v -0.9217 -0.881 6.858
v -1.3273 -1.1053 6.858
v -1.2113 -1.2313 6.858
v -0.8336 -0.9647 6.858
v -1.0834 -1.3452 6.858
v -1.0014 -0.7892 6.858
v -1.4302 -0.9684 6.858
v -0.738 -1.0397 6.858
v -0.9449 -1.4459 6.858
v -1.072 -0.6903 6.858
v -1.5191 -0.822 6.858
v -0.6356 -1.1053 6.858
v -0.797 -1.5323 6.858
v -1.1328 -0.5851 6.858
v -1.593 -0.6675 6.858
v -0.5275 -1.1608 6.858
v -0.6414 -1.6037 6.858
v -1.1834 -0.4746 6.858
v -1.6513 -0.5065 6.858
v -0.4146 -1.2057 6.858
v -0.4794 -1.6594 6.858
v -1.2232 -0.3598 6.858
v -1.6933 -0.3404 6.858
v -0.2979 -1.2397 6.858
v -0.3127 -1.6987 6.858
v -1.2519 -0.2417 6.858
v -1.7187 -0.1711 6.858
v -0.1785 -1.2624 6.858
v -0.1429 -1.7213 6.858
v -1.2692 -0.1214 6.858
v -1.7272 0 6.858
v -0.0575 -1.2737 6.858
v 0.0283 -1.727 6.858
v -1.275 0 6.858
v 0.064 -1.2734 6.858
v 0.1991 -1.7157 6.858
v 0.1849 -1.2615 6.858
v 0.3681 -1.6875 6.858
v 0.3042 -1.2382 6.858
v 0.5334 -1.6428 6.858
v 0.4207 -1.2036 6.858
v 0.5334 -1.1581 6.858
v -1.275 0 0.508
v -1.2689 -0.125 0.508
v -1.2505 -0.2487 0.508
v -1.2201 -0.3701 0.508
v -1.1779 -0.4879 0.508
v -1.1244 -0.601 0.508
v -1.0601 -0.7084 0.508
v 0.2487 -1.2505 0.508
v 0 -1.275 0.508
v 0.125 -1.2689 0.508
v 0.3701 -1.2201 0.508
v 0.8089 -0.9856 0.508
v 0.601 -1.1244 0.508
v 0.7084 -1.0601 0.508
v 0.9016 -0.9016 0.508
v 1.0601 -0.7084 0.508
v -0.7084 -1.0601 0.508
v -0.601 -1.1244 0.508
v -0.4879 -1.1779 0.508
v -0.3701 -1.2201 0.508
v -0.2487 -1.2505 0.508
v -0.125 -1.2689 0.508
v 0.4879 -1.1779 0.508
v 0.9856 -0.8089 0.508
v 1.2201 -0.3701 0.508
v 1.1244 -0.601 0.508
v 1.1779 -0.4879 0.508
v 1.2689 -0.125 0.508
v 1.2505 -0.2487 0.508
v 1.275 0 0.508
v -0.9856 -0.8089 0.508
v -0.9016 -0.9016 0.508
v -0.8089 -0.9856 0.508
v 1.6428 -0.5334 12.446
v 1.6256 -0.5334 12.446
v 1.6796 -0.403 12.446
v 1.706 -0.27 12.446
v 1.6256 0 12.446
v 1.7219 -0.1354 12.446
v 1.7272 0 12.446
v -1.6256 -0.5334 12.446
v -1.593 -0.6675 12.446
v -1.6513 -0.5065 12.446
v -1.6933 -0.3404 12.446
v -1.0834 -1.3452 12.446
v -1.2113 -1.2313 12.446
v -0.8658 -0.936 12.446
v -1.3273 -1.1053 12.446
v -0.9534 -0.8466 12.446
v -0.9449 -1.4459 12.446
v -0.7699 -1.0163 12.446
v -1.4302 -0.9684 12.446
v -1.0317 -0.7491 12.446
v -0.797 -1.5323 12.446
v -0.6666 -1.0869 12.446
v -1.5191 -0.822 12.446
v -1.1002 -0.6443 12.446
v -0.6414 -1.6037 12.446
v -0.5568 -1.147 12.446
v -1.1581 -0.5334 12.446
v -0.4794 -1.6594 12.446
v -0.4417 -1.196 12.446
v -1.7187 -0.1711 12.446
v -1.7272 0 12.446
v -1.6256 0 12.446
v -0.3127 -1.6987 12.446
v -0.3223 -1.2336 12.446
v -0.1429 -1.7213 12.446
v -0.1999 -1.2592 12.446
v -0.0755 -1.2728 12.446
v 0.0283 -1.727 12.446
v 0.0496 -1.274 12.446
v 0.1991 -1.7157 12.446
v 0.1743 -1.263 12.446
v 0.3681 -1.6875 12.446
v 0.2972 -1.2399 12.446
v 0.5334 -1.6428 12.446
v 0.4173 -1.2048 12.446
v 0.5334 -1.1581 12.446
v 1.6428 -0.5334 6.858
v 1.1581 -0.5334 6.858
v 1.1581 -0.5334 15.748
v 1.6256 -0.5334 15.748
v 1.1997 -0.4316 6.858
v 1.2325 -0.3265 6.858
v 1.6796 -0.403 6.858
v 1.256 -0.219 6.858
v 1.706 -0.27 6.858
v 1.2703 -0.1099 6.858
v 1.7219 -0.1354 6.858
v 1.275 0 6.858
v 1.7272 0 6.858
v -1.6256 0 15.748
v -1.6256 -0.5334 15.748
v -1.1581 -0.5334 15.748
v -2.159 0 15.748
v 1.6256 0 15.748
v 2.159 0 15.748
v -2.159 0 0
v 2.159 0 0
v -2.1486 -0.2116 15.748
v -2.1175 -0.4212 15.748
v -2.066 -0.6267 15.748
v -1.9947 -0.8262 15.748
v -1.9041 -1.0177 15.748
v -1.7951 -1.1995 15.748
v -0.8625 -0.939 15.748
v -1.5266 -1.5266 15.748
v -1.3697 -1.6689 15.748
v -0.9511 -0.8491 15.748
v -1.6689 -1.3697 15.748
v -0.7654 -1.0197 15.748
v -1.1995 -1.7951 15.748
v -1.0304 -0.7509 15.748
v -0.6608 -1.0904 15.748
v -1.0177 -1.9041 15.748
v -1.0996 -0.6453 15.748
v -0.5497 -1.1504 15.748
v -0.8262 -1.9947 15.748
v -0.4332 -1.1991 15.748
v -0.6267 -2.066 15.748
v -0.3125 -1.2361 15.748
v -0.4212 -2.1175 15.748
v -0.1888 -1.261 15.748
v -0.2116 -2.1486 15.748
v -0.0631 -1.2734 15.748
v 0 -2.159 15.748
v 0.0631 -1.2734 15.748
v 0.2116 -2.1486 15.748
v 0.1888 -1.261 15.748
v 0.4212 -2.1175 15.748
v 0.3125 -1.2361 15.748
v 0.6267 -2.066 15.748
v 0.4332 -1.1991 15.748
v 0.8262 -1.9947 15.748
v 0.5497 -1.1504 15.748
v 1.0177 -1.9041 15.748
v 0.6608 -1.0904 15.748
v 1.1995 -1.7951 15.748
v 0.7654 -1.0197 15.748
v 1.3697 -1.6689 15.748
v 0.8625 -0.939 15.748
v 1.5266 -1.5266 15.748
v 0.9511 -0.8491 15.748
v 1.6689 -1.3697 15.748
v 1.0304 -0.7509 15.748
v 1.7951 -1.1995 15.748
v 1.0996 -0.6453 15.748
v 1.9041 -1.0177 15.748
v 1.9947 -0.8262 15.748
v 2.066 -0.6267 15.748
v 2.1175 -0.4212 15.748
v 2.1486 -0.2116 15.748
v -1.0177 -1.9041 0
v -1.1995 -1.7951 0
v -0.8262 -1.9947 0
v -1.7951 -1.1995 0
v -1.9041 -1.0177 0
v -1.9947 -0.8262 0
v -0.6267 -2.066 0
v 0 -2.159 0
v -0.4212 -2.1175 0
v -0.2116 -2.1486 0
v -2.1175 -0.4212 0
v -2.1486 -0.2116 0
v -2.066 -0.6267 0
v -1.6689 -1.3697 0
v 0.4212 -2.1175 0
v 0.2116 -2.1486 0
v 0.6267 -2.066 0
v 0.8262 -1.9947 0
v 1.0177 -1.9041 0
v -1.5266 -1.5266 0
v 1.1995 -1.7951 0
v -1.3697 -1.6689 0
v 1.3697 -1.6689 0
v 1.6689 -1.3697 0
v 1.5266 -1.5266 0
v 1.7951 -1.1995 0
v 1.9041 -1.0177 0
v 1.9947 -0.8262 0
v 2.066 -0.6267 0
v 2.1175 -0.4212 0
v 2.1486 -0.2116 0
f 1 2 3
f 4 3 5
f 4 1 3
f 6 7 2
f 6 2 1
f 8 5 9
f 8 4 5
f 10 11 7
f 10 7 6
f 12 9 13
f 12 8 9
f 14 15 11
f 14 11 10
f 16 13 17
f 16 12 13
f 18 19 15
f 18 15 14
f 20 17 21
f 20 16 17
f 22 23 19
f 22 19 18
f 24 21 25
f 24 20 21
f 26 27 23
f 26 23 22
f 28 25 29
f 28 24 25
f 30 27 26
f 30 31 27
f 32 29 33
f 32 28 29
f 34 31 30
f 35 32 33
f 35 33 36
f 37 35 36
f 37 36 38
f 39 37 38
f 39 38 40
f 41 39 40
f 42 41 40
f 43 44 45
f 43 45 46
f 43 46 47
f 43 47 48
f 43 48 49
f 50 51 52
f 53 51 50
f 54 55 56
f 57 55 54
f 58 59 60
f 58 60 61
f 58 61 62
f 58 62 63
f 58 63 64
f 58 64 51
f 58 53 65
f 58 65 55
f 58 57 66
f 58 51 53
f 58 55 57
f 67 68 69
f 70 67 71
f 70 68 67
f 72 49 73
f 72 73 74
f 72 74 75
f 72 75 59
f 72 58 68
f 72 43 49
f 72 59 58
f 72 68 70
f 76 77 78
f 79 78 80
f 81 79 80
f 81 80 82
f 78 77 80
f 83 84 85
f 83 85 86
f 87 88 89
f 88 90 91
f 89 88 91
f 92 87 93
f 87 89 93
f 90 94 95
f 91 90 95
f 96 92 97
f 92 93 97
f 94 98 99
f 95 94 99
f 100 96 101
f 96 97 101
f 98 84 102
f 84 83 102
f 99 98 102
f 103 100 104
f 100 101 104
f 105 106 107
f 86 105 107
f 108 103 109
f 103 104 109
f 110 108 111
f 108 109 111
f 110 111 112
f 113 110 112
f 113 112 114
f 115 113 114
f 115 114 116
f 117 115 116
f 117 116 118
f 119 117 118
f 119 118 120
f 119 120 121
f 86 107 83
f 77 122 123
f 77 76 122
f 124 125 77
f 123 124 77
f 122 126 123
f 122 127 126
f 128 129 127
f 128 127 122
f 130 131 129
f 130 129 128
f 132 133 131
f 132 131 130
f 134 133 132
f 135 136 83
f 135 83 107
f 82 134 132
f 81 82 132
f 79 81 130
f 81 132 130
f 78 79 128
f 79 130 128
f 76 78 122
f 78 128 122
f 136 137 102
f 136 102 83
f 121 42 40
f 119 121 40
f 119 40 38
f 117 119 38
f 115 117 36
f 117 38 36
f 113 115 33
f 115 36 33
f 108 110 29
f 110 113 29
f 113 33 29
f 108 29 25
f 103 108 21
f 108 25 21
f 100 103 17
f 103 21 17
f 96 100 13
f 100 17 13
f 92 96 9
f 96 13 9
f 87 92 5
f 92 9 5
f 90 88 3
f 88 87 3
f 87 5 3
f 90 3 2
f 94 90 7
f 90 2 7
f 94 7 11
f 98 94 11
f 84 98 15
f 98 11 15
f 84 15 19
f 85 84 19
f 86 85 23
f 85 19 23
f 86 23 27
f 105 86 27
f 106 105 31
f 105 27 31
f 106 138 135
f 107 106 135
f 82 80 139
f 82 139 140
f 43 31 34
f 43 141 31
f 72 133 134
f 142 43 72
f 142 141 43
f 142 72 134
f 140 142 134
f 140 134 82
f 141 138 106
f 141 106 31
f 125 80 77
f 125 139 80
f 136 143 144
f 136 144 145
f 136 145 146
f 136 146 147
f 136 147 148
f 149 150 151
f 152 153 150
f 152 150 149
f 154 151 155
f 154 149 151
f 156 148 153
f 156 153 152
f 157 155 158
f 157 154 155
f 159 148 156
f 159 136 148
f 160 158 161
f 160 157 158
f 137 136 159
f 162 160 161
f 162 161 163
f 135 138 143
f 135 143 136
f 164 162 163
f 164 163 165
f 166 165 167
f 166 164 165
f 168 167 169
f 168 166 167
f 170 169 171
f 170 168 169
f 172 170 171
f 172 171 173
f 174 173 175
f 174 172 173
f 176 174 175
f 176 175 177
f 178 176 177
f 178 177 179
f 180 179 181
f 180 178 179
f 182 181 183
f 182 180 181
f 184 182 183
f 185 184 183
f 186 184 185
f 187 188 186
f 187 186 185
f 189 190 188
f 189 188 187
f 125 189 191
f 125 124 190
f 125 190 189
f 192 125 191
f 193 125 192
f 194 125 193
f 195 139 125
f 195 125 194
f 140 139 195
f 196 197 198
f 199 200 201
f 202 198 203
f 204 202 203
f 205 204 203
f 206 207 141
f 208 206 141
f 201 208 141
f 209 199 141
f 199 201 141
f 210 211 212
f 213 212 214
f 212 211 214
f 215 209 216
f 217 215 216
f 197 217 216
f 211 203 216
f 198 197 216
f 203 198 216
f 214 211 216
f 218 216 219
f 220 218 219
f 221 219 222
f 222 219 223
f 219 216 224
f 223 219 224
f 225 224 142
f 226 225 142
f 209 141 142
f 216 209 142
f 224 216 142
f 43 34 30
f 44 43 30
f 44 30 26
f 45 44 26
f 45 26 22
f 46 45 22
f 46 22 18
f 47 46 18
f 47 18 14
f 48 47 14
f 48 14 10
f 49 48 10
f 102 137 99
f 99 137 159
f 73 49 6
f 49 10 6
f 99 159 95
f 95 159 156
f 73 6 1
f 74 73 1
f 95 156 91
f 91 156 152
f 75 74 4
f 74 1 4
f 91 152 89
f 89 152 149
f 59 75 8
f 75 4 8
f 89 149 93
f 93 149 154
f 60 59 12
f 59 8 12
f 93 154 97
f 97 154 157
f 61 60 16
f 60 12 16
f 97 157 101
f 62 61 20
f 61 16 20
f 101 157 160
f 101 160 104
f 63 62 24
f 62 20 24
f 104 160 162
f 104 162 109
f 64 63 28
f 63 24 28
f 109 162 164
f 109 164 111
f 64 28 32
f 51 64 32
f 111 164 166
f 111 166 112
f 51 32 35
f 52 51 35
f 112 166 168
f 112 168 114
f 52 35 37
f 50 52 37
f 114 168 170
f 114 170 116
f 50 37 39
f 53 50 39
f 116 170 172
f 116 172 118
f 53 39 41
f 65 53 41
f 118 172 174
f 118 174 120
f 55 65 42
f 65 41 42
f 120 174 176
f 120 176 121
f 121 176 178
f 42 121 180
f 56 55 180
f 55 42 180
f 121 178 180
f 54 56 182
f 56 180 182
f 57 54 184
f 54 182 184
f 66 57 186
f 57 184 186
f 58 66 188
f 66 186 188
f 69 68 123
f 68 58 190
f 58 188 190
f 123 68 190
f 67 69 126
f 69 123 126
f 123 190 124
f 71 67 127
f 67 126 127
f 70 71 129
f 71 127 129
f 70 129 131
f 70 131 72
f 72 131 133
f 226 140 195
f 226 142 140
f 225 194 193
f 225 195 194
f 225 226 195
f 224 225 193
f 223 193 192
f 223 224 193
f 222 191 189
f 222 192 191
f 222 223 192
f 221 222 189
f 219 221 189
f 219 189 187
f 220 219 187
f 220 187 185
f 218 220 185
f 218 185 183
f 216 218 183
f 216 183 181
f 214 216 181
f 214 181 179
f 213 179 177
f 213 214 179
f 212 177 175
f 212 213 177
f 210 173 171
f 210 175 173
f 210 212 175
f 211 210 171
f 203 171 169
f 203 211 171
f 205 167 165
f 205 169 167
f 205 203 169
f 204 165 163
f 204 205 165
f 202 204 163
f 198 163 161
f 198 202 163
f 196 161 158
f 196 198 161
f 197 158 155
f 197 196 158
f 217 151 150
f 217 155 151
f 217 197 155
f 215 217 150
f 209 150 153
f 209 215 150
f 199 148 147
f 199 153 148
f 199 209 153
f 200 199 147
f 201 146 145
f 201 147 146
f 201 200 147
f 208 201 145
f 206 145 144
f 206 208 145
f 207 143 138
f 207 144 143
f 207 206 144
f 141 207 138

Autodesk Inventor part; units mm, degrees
ref_plane "YZ Plane" through (0, 0, 0) normal (1, 0, 0) x (0, 1, 0)
ref_plane "XZ Plane" through (0, 0, 0) normal (0, 1, 0) x (-1, 0, 0)
sketch "Sketch1" plane through (0, 0, 0) normal (0, 0, 1) x (1, 0, 0)
  circle A0 centre (0, 0) radius 2.159
  dimension "d0" = 4.318
extrude "Extrusion1" add sketch "Sketch1" along normal blind 15.748
sketch "Sketch2" plane through (0, 0, 15.748) normal (0, 0, 1) x (1, 0, 0)
  circle A0 centre (0, 0) radius 1.275
  dimension "d23" = 2.55
extrude "Extrusion2" cut sketch "Sketch2" against normal blind 15.24
sketch "Sketch6" plane through (0, 0, 15.748) normal (0, 0, 1) x (1, 0, 0)
  line L0 (-1.6256, 0.5334) -> (1.6256, 0.5334)
  line L1 (1.6256, 0.5334) -> (1.6256, -0.5334)
  line L2 (1.6256, -0.5334) -> (-1.6256, -0.5334)
  line L3 (-1.6256, -0.5334) -> (-1.6256, 0.5334)
  point P0 (0, 0)
  dimension "d24" = 0.5334
  dimension "d25" = 0.5334
  dimension "d26" = 1.6256
  dimension "d27" = 1.6256
extrude "Extrusion6" cut sketch "Sketch6" against normal blind 8.89
ref_plane "Work Plane2" through (0, 0, 6.858) normal (0, 0, 1) x (1, 0, 0)
sketch "Sketch7" plane through (0, 0, 6.858) normal (0, 0, 1) x (1, 0, 0)
  line L0 (1.6428, -0.5334) -> (1.1581, -0.5334)
  line L1 (-1.6428, 0.5334) -> (-0.5334, 0.5334)
  arc A0 (1.6428, -0.5334) -> (-0.5334, 1.6428) centre (0, 0) ccw
  arc A1 (-1.6428, 0.5334) -> (0.5334, -1.6428) centre (0, 0) ccw
  line L2 (1.6256, -0.5334) -> (0.5334, -0.5334)
  line L3 (0.5334, -0.5334) -> (0.5334, -1.6428)
  line L4 (-0.5334, 0.5334) -> (-0.5334, 1.6428)
extrude "Extrusion7" cut sketch "Sketch7" along normal blind 5.588
sketch "Sketch8" plane through (0, 0, 0) normal (0, 0, -1) x (-1, 0, 0)
  line L0 (-3.8846, 4.0845) -> (4.056, 4.0845)
  line L1 (4.056, 4.0845) -> (4.056, 0)
  line L2 (4.056, 0) -> (-3.8846, 0)
  line L3 (-3.8846, 0) -> (-3.8846, 4.0845)
  point P0 (0, 0)
extrude "Extrusion8" cut sketch "Sketch8" against normal blind 25.4
properties part number "Snap-Twist Idea F"
